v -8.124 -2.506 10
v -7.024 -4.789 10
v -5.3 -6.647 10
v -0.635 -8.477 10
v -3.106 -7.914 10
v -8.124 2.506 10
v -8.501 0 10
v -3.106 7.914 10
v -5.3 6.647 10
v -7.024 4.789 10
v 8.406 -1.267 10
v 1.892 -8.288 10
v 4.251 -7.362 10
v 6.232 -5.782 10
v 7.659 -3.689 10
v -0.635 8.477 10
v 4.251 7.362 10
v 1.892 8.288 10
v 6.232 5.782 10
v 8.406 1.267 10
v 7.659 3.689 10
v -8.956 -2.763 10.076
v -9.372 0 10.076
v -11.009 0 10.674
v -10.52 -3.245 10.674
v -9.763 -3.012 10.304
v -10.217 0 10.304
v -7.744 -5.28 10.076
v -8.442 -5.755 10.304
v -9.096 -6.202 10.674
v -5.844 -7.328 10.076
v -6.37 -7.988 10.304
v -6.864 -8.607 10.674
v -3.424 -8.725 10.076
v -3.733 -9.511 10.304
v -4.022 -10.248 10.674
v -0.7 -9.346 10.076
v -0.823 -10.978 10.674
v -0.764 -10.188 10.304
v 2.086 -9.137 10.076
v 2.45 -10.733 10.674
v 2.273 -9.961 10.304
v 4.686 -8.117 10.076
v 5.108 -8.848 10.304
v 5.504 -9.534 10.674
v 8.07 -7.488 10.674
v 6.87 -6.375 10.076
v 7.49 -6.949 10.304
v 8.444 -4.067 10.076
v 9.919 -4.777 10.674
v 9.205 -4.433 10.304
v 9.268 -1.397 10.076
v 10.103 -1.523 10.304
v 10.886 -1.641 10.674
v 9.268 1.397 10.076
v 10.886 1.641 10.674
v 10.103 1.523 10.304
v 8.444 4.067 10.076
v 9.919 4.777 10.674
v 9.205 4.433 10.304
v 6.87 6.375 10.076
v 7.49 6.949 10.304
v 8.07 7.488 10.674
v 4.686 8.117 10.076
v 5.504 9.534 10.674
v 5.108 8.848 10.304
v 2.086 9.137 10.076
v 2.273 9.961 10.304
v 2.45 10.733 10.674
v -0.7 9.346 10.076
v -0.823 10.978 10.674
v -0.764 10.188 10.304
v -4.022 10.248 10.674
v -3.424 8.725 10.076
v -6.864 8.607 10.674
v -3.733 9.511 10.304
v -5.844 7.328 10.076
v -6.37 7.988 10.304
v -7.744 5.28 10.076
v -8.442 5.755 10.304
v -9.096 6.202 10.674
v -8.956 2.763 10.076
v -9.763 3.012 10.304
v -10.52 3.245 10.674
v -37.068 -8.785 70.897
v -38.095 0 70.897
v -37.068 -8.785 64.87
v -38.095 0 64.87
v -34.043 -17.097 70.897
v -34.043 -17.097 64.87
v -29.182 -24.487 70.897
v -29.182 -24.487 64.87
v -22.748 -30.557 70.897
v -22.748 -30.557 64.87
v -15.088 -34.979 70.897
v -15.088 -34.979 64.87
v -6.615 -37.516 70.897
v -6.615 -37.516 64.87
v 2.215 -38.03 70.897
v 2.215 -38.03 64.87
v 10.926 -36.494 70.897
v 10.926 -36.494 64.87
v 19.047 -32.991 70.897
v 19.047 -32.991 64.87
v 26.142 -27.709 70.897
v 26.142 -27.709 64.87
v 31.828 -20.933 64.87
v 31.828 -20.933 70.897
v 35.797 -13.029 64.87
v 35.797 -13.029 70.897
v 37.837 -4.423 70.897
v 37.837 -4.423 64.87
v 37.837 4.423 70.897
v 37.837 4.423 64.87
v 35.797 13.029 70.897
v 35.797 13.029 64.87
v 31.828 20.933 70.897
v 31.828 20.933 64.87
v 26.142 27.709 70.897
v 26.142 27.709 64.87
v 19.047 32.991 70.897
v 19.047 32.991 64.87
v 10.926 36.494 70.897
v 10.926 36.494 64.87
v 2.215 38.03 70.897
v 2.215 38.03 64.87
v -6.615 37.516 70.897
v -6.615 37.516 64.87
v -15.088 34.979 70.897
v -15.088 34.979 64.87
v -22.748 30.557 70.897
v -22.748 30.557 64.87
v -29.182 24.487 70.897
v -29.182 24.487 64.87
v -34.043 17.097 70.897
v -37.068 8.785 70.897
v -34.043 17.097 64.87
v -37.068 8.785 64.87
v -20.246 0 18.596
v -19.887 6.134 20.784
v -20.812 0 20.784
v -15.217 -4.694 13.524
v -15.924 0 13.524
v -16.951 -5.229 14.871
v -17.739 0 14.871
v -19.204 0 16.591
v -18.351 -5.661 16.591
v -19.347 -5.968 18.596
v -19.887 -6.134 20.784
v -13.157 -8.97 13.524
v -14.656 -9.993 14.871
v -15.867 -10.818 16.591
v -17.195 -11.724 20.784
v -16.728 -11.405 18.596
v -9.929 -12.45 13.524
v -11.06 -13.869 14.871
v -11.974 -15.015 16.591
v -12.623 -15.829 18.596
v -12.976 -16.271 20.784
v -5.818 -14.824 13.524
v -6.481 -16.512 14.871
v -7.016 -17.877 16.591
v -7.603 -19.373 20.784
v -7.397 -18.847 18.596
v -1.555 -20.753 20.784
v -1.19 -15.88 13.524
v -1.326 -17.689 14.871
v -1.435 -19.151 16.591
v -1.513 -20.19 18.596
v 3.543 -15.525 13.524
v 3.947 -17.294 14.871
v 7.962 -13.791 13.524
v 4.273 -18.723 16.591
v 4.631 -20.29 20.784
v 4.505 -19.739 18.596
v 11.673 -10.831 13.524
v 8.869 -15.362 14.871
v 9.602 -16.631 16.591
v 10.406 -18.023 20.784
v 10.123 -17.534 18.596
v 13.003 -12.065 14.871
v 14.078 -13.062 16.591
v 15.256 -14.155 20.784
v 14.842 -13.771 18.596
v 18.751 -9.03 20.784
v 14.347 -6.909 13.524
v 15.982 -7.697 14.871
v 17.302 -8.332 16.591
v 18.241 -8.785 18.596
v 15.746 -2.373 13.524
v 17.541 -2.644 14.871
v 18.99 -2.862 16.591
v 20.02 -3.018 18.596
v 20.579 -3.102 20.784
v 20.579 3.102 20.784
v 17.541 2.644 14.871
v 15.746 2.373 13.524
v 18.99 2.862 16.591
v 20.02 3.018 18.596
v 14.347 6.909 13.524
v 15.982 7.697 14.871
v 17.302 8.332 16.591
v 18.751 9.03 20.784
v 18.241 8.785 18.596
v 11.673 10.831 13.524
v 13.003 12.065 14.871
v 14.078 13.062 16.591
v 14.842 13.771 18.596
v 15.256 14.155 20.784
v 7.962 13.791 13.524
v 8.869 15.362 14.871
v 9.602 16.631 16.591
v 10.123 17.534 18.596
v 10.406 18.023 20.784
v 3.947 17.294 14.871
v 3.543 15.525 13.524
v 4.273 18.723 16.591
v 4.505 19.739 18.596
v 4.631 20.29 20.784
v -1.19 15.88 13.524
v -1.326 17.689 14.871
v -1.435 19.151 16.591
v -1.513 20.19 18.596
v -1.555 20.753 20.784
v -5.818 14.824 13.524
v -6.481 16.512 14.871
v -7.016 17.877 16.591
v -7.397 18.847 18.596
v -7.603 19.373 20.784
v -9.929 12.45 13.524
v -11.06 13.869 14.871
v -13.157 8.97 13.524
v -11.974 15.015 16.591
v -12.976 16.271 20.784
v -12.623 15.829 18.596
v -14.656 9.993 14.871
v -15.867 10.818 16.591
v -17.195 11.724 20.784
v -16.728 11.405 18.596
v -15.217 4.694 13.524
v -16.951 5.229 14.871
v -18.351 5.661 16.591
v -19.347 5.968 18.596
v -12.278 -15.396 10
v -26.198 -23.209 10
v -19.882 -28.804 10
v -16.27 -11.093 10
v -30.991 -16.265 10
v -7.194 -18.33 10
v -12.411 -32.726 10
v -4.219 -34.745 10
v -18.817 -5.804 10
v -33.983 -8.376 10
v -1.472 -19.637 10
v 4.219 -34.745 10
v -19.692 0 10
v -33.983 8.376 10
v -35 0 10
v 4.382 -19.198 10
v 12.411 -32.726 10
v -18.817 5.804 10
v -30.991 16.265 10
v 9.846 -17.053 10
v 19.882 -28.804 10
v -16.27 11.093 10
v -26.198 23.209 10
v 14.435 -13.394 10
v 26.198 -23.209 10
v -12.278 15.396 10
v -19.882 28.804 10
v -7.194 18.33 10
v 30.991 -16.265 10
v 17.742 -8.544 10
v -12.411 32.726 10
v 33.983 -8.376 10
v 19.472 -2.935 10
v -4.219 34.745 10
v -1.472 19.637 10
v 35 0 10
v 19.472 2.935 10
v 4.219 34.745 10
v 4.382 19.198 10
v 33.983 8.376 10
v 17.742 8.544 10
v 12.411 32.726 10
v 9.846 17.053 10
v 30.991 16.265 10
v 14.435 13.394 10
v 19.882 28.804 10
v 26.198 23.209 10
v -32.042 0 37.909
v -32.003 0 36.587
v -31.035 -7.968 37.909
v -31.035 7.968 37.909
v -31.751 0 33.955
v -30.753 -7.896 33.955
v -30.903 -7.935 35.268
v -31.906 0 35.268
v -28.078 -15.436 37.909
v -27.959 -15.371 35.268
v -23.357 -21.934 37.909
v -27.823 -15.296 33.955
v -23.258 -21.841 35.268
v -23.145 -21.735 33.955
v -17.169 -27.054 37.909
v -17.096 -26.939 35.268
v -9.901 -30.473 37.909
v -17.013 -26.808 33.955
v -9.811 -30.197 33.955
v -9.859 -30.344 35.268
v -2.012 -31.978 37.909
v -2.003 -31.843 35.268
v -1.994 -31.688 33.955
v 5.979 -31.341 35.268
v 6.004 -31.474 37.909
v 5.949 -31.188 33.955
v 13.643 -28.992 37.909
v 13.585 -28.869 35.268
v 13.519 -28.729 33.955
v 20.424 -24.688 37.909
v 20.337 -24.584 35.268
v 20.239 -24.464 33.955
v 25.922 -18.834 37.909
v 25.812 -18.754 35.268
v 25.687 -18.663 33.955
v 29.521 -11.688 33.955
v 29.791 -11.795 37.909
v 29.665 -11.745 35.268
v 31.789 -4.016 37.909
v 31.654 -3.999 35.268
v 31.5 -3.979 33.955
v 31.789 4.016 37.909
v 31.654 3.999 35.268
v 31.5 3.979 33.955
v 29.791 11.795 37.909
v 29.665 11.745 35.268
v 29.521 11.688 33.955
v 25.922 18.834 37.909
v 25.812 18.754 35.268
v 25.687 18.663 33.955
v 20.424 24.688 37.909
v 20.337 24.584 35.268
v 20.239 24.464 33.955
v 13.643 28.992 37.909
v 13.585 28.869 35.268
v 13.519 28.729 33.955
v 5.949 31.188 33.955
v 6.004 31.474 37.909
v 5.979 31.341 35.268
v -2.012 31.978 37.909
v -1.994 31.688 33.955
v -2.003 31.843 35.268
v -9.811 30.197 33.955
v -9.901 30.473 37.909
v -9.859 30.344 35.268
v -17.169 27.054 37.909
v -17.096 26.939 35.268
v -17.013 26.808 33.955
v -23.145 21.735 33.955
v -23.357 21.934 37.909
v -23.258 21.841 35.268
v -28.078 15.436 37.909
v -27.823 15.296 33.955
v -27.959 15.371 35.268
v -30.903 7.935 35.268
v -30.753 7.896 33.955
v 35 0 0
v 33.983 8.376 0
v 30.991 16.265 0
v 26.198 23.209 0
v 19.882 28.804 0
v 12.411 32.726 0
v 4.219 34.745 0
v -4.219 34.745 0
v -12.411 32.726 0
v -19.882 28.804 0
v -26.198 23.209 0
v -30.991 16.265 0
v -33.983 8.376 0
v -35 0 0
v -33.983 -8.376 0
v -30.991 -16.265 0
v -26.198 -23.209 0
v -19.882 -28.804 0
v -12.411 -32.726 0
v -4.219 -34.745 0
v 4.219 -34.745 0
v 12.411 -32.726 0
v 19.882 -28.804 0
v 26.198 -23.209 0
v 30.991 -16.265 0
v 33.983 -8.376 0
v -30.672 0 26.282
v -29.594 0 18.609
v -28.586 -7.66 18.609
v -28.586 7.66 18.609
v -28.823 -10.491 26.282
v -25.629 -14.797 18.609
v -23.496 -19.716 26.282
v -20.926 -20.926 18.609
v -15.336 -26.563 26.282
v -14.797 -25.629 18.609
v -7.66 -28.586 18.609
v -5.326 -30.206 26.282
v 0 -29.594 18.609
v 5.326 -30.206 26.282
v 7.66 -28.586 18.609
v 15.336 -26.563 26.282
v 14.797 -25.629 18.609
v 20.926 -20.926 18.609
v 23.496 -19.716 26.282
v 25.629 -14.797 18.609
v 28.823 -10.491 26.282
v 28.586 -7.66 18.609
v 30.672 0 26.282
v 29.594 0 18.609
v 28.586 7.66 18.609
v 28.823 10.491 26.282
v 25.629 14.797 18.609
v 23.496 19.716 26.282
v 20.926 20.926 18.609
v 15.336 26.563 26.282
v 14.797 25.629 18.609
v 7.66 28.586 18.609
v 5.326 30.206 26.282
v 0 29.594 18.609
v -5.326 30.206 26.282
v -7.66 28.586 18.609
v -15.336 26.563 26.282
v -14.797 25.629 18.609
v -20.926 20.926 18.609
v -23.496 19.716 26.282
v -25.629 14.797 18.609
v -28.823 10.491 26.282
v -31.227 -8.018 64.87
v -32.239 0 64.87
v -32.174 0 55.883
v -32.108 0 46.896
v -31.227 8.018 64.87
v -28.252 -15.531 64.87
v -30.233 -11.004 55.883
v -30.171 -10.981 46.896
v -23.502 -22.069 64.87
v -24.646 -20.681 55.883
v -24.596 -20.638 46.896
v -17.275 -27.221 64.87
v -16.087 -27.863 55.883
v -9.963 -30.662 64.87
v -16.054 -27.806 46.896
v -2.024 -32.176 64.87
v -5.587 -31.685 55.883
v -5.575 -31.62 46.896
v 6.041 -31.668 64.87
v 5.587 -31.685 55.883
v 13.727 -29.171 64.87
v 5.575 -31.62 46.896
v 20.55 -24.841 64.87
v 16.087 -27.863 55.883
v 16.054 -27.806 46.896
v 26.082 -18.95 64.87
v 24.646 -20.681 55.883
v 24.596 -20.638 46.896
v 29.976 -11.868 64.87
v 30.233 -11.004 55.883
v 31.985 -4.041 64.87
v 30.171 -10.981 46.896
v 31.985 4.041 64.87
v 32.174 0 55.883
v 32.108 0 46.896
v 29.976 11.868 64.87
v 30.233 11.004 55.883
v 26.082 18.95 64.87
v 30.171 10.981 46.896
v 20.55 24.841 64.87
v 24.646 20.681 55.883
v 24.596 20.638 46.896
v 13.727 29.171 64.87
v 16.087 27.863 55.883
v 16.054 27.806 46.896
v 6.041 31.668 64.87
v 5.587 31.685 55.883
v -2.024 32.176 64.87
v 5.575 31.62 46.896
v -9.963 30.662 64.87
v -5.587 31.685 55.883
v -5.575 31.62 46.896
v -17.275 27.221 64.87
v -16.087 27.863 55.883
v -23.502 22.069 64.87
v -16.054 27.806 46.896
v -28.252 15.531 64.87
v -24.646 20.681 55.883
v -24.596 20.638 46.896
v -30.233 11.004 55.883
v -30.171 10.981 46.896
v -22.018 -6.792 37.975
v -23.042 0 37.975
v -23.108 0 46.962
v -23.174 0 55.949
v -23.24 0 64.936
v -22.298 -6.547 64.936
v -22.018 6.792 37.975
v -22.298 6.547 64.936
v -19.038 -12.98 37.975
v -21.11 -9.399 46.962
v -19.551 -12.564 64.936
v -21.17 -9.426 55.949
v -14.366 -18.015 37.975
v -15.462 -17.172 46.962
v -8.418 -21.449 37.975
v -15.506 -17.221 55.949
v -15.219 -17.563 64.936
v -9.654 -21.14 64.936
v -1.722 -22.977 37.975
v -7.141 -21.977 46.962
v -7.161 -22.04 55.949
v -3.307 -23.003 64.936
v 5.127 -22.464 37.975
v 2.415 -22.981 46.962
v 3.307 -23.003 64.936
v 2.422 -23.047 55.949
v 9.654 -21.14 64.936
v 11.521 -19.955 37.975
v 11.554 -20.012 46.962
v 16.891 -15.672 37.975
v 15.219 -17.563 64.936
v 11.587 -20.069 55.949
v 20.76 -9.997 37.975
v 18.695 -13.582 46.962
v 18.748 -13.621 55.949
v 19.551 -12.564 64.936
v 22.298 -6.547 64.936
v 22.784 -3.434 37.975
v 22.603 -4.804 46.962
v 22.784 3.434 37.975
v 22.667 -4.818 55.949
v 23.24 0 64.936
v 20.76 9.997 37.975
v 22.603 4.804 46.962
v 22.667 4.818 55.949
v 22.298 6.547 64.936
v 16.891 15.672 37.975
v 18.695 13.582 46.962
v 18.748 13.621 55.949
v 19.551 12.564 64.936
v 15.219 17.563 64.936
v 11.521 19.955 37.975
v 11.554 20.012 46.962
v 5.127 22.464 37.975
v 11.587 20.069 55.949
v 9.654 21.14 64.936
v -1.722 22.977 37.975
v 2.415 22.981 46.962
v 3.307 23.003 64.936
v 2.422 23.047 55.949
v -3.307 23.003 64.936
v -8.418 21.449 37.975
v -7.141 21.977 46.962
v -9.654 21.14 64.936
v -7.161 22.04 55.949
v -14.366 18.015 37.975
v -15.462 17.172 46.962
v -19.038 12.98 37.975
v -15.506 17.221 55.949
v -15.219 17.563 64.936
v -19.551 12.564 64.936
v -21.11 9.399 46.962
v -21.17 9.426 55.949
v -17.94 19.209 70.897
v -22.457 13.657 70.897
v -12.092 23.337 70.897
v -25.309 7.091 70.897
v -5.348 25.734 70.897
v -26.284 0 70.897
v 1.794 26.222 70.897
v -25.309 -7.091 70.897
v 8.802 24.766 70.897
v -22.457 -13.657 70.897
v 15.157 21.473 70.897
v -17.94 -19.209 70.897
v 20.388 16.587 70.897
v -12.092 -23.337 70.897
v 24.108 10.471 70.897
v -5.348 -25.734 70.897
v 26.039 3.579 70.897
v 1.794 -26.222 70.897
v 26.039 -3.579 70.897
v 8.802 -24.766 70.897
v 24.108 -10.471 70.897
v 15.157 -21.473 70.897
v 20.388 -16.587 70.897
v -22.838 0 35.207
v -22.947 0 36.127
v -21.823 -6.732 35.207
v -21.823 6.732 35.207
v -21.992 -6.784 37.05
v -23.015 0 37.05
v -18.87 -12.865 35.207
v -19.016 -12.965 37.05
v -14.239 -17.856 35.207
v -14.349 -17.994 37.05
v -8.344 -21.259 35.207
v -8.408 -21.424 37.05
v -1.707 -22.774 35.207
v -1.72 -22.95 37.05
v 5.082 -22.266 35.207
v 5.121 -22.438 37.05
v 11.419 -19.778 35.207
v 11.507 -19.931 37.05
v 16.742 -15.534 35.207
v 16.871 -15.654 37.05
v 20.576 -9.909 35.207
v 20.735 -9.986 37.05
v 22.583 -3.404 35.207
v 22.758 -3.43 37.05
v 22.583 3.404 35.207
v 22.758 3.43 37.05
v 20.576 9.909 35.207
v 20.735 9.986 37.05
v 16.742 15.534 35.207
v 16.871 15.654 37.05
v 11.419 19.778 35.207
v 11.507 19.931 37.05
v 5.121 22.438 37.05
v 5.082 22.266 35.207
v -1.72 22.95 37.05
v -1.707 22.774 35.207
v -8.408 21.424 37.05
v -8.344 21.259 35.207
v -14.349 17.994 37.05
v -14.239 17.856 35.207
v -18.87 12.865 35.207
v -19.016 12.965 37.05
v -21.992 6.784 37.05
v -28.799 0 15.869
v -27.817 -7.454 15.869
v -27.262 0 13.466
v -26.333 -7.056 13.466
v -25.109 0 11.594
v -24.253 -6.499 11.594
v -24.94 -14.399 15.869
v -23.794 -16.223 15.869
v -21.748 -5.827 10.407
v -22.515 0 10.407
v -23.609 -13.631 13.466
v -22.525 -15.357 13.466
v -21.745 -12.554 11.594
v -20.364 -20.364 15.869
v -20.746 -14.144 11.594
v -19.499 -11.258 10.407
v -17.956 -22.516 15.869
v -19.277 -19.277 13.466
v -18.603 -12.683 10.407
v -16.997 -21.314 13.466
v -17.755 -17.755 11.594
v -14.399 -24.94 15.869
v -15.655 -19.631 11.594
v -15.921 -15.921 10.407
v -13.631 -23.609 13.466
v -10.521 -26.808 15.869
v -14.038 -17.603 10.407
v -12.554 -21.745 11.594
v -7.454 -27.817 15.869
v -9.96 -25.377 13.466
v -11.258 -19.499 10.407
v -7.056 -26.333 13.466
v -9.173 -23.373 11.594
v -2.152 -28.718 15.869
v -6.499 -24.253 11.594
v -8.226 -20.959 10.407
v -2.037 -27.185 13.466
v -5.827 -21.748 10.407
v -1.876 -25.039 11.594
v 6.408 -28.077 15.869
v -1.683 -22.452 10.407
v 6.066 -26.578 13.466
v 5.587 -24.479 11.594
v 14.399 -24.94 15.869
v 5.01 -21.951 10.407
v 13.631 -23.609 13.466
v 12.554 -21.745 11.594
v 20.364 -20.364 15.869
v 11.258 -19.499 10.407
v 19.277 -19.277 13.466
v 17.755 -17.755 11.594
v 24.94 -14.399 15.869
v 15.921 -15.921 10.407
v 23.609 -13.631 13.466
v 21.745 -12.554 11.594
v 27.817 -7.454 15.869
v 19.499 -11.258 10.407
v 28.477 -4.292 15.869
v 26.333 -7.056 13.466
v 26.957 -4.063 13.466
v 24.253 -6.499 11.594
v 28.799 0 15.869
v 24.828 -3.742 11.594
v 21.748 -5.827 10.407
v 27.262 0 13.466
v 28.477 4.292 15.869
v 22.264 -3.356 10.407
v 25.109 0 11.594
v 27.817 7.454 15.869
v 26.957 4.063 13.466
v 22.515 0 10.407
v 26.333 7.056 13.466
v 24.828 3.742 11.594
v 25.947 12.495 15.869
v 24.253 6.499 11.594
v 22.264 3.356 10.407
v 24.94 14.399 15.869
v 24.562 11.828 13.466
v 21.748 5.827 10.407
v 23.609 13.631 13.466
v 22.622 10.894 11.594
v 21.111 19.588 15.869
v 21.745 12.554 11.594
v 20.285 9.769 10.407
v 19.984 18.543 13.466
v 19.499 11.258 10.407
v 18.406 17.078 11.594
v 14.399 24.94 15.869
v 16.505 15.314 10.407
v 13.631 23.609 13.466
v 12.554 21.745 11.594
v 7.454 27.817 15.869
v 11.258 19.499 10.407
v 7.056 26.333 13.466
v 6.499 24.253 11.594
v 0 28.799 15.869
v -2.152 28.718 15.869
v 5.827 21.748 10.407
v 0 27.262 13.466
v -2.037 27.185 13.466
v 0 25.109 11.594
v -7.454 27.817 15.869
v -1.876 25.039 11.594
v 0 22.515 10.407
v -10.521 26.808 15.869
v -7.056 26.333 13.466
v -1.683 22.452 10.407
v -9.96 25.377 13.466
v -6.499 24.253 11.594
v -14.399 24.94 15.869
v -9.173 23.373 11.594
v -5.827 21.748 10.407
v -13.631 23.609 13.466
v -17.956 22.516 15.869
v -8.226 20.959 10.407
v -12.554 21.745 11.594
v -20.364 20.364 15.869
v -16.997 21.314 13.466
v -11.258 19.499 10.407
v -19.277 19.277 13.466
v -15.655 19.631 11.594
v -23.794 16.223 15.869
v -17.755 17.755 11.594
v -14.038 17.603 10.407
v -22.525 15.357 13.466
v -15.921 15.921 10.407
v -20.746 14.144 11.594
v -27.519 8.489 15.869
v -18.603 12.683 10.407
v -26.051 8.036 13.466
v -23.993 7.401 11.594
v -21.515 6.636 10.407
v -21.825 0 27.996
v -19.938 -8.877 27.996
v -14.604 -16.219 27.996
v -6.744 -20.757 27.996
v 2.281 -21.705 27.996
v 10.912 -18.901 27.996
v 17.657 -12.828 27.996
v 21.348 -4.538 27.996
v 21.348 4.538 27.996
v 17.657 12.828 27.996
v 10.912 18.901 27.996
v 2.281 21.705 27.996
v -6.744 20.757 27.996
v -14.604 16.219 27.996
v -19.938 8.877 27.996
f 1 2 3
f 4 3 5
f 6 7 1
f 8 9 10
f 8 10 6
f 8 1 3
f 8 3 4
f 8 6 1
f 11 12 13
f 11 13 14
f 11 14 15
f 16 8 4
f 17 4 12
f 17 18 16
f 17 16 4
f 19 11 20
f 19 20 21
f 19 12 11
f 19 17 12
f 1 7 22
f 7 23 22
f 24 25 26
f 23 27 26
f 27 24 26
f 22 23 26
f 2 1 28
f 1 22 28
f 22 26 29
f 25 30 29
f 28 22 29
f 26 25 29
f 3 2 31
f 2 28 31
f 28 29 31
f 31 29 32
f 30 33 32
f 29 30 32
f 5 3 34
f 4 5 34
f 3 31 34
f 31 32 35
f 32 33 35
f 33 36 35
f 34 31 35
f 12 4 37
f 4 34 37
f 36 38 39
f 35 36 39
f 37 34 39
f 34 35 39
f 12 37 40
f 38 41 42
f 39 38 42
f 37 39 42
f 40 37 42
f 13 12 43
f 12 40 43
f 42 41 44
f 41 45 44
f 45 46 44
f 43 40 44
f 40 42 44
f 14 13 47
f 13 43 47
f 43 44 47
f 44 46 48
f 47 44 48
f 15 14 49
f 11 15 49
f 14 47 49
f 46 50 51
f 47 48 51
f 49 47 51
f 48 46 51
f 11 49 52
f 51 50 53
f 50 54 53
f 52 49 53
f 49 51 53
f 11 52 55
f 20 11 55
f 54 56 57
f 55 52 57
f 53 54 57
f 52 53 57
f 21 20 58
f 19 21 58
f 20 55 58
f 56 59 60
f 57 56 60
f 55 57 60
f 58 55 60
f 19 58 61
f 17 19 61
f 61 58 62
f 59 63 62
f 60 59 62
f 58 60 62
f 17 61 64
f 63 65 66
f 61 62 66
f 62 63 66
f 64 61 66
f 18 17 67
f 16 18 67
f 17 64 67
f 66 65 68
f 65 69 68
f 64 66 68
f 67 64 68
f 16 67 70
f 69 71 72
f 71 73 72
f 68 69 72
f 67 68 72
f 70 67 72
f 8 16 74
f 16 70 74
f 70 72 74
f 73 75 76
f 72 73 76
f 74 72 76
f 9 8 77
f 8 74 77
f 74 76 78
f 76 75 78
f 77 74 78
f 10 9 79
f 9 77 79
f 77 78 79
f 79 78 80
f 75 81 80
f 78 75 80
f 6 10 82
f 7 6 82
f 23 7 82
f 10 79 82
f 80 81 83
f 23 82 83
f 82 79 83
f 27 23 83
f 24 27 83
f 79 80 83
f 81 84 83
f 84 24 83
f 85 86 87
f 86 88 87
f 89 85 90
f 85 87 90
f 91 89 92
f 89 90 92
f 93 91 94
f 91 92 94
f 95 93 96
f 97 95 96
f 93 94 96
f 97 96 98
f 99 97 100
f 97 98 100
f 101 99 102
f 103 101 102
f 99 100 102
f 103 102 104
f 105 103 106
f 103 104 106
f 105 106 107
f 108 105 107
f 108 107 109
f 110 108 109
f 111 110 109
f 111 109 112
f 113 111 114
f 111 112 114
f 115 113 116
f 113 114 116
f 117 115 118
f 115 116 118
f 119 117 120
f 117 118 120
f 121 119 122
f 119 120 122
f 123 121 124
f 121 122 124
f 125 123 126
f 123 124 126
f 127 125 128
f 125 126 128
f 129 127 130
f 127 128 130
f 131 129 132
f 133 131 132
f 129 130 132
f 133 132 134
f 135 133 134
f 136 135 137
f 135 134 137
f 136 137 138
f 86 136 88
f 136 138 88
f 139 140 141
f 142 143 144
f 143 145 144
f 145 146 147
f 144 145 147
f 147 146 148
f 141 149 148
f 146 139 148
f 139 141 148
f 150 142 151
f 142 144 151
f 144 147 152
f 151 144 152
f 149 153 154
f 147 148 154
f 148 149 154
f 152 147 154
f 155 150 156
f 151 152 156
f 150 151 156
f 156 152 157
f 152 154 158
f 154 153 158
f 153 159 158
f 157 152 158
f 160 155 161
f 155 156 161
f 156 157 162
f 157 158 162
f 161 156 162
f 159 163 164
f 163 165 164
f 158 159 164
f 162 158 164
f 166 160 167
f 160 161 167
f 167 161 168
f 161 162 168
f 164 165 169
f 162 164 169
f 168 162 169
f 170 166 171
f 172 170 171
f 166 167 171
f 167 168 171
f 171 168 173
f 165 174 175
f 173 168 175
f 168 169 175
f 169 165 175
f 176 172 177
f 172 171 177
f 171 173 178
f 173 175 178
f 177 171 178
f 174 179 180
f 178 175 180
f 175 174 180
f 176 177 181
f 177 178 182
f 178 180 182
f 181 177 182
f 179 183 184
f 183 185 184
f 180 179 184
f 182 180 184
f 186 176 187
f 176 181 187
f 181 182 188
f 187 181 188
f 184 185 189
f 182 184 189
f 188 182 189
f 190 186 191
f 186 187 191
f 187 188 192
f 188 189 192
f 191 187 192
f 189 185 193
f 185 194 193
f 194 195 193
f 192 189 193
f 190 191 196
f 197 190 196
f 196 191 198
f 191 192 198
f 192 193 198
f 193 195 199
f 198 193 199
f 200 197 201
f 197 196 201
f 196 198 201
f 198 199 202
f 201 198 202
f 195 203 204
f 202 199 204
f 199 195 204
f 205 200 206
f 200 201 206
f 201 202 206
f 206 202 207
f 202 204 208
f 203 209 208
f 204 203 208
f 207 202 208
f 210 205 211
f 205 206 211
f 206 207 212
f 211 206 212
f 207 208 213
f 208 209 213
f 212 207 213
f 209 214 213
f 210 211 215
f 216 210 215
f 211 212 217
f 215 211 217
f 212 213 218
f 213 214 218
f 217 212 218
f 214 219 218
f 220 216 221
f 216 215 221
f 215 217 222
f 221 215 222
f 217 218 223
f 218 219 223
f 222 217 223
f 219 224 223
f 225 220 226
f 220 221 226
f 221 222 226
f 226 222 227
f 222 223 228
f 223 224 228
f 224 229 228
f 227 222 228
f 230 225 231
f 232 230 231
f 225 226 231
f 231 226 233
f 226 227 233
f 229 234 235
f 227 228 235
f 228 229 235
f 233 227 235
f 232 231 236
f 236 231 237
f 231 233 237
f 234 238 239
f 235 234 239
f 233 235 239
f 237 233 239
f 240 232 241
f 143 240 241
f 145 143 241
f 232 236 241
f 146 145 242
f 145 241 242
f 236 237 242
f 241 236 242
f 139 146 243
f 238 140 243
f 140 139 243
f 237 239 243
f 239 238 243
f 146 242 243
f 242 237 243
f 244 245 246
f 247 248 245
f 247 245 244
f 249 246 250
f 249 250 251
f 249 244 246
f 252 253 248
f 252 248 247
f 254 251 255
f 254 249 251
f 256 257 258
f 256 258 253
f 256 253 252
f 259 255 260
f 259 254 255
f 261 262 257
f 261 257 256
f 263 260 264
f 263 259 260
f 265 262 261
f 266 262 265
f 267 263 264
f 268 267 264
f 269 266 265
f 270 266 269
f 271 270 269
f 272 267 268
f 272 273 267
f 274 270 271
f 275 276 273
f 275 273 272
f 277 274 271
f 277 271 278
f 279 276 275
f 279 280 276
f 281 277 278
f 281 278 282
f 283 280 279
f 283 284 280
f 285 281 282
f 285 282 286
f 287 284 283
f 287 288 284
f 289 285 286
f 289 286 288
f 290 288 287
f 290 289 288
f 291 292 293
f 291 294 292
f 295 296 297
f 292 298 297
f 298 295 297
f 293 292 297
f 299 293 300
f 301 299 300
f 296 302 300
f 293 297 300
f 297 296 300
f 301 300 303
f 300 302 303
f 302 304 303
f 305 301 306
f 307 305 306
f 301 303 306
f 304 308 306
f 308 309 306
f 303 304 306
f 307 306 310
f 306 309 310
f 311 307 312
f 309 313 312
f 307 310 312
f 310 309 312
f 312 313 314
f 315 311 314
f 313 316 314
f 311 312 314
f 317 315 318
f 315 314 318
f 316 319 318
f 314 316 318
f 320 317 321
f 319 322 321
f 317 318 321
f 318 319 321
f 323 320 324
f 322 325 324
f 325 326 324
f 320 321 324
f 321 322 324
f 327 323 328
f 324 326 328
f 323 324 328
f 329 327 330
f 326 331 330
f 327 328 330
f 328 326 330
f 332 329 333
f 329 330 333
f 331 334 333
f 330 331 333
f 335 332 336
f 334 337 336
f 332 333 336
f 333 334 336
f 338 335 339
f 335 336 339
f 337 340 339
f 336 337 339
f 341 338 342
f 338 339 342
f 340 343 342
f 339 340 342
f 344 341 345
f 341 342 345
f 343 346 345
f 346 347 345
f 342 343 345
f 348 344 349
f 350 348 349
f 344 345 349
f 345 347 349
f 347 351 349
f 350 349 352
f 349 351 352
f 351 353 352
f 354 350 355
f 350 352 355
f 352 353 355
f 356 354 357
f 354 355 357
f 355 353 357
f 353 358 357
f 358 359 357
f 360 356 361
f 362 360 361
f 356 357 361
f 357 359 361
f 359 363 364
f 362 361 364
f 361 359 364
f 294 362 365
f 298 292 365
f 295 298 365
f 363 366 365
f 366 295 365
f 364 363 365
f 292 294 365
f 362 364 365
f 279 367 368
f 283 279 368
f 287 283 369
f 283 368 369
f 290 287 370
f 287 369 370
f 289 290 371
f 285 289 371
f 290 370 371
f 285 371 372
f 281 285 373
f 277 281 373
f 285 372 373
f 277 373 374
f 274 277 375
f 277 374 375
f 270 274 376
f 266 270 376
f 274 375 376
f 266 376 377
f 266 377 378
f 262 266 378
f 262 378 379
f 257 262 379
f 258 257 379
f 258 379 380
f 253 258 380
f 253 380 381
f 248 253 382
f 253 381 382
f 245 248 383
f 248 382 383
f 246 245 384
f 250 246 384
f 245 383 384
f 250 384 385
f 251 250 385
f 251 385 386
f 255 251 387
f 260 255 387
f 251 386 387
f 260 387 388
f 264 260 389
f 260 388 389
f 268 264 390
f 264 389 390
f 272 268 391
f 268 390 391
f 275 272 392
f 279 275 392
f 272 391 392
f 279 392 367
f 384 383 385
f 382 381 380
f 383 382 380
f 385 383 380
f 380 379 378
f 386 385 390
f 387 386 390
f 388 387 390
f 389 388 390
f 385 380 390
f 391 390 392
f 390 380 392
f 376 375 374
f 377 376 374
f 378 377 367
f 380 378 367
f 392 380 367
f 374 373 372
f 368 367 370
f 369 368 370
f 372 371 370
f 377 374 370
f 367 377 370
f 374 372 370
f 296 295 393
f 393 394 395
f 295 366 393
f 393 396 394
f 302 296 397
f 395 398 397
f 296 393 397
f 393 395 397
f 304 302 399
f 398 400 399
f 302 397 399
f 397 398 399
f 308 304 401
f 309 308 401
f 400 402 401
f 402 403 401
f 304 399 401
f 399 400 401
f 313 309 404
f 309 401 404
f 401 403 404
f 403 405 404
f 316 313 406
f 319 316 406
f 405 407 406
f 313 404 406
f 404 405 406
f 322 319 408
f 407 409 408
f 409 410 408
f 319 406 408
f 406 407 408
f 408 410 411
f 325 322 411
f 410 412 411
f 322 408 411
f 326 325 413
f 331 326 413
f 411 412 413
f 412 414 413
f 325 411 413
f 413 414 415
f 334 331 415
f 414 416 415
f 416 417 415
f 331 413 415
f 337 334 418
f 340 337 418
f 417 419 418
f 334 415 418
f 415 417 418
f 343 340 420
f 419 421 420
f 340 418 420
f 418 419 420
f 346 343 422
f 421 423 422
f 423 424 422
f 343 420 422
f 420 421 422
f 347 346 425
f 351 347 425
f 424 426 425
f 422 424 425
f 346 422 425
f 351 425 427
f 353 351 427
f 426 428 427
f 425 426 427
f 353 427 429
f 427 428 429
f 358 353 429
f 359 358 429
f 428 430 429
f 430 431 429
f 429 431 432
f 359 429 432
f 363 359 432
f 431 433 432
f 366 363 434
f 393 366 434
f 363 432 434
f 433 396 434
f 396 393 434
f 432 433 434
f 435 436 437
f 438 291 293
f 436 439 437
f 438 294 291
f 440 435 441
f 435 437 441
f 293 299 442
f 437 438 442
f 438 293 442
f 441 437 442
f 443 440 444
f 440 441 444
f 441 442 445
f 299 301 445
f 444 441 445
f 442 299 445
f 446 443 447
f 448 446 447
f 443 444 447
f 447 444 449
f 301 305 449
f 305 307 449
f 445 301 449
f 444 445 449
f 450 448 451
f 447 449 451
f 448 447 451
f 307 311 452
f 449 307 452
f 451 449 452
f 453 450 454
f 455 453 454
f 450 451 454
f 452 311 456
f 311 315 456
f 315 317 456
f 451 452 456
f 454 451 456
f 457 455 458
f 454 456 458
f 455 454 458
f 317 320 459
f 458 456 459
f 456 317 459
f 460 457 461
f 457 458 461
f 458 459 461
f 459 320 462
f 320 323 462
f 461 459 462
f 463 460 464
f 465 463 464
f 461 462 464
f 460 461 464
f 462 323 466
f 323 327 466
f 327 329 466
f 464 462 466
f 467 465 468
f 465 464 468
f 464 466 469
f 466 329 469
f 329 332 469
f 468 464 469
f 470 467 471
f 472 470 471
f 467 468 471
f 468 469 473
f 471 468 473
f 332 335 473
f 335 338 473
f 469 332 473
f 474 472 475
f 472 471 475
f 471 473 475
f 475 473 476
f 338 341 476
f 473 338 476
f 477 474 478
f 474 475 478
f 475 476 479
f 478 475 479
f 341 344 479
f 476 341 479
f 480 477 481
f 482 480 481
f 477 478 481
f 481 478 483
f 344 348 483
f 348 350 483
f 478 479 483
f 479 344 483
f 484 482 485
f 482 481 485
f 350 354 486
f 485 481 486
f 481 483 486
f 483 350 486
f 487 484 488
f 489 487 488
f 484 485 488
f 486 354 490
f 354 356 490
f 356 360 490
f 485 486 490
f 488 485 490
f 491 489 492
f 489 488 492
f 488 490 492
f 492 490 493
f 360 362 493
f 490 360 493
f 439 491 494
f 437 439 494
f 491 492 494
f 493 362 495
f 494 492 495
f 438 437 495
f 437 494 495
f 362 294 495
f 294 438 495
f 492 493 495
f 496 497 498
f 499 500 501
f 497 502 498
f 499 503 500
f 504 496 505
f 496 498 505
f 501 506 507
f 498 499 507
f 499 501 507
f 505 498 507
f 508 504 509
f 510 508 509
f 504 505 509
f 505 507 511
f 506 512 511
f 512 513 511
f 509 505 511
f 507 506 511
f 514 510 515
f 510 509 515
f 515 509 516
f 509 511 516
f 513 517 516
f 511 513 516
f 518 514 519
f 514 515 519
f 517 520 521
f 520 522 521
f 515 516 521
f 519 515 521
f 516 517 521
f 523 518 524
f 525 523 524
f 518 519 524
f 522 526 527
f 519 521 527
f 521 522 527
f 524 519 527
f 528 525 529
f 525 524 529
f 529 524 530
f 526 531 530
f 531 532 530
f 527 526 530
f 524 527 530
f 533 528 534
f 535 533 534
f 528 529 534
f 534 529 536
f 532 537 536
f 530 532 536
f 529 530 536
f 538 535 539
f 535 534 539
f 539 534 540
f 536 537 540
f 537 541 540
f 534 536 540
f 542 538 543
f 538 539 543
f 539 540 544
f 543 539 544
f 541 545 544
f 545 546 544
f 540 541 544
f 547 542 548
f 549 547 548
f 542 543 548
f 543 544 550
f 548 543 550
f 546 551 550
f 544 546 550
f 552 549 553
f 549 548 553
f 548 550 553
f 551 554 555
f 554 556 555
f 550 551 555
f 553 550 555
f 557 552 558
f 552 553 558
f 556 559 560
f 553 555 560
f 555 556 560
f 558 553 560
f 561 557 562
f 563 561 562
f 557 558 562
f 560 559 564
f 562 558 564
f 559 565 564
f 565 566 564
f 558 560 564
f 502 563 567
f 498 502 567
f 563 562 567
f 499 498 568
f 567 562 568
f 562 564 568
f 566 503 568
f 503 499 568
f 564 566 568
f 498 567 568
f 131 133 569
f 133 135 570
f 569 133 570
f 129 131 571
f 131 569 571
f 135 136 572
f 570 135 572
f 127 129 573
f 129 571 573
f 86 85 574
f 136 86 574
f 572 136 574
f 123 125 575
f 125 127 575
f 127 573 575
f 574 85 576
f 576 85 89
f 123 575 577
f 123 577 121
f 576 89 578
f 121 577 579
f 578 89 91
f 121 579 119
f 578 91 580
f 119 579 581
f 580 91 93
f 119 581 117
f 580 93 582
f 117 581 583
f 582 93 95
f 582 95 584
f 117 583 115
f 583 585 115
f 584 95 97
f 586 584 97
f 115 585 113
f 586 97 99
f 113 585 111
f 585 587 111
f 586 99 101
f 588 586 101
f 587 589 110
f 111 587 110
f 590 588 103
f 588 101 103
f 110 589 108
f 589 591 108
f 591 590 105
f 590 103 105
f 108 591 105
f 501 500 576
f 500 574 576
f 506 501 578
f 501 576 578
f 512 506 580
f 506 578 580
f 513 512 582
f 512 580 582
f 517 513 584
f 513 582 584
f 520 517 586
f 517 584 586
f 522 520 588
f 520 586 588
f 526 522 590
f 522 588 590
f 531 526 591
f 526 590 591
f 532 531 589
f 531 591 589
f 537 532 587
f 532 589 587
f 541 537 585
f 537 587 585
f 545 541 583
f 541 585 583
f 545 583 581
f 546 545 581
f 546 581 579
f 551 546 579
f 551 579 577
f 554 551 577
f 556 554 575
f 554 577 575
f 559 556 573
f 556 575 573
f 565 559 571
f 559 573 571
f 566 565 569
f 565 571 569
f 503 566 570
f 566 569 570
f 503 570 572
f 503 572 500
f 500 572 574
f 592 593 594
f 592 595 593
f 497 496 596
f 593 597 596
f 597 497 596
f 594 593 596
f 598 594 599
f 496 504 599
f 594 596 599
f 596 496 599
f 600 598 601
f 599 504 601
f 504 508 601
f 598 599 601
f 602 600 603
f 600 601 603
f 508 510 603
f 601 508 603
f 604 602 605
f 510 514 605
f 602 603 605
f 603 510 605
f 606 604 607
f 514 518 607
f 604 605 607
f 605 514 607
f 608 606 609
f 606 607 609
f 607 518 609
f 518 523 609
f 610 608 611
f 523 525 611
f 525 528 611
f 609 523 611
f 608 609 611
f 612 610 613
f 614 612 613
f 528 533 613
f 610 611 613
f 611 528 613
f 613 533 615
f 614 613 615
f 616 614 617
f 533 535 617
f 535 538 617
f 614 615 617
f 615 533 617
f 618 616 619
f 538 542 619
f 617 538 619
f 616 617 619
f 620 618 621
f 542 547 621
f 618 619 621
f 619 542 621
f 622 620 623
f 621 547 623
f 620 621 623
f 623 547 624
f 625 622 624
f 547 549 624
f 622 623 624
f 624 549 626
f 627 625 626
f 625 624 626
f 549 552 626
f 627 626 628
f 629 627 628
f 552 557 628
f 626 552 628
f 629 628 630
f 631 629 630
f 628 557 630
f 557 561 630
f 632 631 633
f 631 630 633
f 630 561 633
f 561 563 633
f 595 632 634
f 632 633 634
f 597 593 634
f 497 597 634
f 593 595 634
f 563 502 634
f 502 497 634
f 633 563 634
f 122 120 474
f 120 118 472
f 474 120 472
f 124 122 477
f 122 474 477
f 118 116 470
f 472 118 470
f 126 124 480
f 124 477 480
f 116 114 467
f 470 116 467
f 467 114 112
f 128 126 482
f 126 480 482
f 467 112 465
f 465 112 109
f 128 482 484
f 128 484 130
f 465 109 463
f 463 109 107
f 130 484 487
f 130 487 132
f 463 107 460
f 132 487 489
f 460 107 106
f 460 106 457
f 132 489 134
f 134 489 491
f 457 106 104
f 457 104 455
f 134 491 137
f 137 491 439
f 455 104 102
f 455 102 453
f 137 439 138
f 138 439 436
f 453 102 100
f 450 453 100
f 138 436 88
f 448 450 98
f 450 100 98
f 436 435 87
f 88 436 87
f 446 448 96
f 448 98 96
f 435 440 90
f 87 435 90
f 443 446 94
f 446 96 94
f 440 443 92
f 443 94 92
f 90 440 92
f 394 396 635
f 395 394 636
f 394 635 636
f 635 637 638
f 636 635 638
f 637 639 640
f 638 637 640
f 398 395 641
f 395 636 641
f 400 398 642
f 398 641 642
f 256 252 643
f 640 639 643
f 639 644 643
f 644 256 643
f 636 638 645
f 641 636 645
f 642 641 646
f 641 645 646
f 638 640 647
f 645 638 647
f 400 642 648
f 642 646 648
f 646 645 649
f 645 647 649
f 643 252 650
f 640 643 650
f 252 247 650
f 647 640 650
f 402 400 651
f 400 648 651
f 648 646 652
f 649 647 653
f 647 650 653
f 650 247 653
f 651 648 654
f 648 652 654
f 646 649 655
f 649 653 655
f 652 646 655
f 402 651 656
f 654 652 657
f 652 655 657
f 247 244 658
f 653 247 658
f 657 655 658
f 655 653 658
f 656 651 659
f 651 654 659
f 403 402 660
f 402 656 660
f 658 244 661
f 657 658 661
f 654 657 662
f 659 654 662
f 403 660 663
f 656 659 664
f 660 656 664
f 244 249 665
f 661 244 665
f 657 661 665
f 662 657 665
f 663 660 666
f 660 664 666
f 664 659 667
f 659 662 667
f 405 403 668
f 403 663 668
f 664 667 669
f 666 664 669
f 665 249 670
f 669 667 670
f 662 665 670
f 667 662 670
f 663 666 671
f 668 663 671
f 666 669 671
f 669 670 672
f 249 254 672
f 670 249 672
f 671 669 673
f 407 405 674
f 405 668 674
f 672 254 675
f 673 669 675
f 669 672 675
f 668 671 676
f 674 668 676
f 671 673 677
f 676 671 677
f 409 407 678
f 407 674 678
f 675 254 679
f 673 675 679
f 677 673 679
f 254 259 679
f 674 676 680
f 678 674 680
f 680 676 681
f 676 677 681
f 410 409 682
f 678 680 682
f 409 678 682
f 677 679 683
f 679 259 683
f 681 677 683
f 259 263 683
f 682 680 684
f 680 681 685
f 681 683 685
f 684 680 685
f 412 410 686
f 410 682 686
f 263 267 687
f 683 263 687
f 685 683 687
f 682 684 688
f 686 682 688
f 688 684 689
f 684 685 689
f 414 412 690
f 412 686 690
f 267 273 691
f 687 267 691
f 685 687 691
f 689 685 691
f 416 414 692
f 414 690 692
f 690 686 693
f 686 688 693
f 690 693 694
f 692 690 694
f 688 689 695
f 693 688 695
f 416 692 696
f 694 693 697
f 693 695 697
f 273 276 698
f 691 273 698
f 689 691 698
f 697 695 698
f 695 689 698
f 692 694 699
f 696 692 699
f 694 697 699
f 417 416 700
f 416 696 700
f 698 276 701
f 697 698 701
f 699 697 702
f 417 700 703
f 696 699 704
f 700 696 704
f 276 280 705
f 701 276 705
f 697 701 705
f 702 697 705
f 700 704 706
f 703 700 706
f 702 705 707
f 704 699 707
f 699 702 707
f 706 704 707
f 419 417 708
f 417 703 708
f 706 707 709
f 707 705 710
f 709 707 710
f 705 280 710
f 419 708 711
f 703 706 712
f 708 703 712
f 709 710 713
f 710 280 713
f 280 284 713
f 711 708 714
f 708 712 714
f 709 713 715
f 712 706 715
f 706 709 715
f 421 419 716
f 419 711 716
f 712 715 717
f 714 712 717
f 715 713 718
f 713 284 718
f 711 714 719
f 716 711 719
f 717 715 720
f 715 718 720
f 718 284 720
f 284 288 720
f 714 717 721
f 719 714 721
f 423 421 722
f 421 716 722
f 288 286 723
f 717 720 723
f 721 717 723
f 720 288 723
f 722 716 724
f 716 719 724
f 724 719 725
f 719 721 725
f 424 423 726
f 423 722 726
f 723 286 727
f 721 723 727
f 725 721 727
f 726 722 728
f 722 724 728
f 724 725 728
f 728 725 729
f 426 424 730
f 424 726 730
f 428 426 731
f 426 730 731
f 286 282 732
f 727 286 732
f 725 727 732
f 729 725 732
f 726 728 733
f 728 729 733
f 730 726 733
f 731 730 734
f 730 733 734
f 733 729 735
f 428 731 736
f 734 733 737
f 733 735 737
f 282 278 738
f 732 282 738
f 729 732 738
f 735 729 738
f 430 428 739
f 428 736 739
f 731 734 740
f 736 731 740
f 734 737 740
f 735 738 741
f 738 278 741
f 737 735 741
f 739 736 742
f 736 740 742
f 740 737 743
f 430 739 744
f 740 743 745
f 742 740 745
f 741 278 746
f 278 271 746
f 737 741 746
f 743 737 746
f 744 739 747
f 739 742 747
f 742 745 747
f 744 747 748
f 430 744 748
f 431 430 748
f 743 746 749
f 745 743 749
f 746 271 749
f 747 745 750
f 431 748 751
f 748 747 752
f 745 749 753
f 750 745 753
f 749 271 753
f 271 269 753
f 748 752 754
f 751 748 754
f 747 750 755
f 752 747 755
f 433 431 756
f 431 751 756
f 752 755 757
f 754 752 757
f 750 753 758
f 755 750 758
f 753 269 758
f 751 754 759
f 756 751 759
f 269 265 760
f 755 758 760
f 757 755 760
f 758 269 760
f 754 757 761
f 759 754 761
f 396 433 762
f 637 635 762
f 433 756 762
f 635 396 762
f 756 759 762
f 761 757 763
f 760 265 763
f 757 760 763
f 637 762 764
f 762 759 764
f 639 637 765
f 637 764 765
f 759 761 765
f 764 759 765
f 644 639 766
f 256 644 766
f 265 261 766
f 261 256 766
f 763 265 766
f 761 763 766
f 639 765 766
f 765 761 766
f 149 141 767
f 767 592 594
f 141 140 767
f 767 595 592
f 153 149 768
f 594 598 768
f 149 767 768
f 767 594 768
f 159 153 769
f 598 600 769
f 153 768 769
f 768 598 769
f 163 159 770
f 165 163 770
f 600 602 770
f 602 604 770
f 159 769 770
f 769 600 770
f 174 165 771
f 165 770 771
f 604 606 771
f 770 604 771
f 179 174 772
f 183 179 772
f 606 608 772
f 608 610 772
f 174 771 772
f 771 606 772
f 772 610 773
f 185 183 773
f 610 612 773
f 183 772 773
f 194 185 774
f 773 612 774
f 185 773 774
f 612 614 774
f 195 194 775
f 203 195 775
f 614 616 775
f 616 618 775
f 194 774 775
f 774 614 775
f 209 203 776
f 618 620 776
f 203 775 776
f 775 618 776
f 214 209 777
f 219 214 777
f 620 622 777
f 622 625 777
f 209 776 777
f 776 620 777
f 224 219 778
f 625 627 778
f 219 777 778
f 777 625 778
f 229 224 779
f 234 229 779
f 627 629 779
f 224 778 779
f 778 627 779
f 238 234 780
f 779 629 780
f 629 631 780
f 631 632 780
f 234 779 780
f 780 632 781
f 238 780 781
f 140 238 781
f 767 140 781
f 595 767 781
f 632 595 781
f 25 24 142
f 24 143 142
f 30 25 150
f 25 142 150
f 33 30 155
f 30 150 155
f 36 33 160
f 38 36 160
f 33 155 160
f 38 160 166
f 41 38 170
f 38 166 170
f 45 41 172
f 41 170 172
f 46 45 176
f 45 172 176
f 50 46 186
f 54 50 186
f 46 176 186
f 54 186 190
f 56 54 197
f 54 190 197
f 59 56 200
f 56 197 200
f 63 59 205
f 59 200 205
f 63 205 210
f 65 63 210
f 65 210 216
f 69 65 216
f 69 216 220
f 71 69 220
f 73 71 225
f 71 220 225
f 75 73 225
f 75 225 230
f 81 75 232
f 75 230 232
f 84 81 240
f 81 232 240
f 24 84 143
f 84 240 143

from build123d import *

# Parameters (mm, degrees)
F0_R     = 35
F1_DEPTH = 10


with BuildPart() as f1:
    # F0 (on Top) → F1 (new body)
    with BuildSketch(Plane.XY):
        Circle(F0_R)
    extrude(amount=F1_DEPTH)

    # F2 (on Front) → F3 (revolve)
    with BuildSketch(Plane.XZ):
        with BuildLine():
            Line((-26.283575, 70.897411), (-38.094532, 70.897411))
            Line((-38.094532, 70.897411), (-38.094532, 64.87011))
            Line((-38.094532, 64.87011), (-32.239489, 64.87011))
            Line((-32.239489, 64.87011), (-32.041561, 37.90903))
            ThreePointArc((-32.041561, 37.90903), (-31.961449, 35.927279), (-31.750564, 33.955151))
            Line((-31.750564, 33.955151), (-29.594322, 18.60863))
            ThreePointArc((-29.594322, 18.60863), (-26.252318, 12.453024), (-19.69159, 10))
            Line((-19.69159, 10), (-8.501253, 10))
            ThreePointArc((-8.501253, 10), (-9.799669, 10.171531), (-11.008998, 10.674353))
            Line((-11.008998, 10.674353), (-15.924307, 13.523948))
            ThreePointArc((-15.924307, 13.523948), (-19.204295, 16.590883), (-20.811549, 20.783871))
            Line((-20.811549, 20.783871), (-22.838106, 35.207384))
            ThreePointArc((-22.838106, 35.207384), (-22.985725, 36.587873), (-23.041804, 37.9751))
            Line((-23.041804, 37.9751), (-23.239732, 64.936179))
            Line((-23.239732, 64.936179), (-26.283575, 70.897411))
        make_face()
    revolve(axis=Axis((0, 0, 28.011288), (0, 0, 1)))


solid = f1.part
